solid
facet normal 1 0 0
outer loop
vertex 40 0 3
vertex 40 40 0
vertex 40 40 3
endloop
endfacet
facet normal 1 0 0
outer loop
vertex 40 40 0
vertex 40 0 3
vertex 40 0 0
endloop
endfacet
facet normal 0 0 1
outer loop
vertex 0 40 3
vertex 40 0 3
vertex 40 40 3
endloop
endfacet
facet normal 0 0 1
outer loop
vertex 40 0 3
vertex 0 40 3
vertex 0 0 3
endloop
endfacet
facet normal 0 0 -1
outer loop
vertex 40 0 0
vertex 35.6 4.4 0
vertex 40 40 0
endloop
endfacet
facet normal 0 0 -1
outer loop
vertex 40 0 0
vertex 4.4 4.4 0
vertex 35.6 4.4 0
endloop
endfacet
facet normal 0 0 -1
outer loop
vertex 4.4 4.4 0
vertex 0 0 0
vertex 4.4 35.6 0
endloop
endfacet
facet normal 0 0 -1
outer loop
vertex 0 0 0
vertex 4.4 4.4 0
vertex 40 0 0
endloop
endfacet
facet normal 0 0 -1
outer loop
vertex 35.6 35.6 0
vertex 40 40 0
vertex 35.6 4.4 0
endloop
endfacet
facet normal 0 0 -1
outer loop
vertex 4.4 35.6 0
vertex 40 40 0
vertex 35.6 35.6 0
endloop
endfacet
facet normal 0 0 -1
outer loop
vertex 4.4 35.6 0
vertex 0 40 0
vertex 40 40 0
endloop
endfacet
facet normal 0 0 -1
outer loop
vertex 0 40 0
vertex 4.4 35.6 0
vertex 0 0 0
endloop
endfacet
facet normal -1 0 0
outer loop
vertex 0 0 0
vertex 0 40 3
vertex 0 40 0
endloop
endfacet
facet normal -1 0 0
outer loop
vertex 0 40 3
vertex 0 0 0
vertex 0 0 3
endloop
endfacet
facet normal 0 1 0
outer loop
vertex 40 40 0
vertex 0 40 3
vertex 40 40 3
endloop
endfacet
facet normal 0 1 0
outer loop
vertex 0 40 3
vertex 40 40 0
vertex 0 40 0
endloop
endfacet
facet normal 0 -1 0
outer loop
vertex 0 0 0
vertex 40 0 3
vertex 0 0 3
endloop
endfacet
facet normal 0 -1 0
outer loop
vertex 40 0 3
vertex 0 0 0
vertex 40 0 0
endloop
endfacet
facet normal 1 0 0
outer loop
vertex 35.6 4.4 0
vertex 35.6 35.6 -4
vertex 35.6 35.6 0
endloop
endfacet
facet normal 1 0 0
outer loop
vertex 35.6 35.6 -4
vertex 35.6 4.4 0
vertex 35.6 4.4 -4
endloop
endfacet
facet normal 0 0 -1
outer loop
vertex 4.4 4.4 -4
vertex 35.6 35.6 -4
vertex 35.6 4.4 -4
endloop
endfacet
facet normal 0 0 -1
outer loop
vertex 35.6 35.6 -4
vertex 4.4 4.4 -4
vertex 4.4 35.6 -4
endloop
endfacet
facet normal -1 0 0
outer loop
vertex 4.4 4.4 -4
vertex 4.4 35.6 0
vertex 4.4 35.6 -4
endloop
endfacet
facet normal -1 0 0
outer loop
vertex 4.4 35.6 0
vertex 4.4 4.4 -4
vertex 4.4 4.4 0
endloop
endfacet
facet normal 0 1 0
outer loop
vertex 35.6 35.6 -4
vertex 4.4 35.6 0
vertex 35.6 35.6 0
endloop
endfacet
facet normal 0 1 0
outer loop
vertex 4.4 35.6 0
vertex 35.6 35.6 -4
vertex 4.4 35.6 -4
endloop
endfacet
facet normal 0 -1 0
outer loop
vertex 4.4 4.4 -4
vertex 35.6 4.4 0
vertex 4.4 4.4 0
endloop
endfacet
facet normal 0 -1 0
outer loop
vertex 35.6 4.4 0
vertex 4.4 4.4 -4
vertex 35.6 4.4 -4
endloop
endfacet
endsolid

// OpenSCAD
// TEMPLATE ONLY. Measure and edit before printing. Millimetres.
difference(){union(){
translate([0, 0, 0]) cube([40, 40, 3]);
translate([4.4, 4.4, -4]) cube([31.200000000000003, 31.200000000000003, 4]);
}

}
